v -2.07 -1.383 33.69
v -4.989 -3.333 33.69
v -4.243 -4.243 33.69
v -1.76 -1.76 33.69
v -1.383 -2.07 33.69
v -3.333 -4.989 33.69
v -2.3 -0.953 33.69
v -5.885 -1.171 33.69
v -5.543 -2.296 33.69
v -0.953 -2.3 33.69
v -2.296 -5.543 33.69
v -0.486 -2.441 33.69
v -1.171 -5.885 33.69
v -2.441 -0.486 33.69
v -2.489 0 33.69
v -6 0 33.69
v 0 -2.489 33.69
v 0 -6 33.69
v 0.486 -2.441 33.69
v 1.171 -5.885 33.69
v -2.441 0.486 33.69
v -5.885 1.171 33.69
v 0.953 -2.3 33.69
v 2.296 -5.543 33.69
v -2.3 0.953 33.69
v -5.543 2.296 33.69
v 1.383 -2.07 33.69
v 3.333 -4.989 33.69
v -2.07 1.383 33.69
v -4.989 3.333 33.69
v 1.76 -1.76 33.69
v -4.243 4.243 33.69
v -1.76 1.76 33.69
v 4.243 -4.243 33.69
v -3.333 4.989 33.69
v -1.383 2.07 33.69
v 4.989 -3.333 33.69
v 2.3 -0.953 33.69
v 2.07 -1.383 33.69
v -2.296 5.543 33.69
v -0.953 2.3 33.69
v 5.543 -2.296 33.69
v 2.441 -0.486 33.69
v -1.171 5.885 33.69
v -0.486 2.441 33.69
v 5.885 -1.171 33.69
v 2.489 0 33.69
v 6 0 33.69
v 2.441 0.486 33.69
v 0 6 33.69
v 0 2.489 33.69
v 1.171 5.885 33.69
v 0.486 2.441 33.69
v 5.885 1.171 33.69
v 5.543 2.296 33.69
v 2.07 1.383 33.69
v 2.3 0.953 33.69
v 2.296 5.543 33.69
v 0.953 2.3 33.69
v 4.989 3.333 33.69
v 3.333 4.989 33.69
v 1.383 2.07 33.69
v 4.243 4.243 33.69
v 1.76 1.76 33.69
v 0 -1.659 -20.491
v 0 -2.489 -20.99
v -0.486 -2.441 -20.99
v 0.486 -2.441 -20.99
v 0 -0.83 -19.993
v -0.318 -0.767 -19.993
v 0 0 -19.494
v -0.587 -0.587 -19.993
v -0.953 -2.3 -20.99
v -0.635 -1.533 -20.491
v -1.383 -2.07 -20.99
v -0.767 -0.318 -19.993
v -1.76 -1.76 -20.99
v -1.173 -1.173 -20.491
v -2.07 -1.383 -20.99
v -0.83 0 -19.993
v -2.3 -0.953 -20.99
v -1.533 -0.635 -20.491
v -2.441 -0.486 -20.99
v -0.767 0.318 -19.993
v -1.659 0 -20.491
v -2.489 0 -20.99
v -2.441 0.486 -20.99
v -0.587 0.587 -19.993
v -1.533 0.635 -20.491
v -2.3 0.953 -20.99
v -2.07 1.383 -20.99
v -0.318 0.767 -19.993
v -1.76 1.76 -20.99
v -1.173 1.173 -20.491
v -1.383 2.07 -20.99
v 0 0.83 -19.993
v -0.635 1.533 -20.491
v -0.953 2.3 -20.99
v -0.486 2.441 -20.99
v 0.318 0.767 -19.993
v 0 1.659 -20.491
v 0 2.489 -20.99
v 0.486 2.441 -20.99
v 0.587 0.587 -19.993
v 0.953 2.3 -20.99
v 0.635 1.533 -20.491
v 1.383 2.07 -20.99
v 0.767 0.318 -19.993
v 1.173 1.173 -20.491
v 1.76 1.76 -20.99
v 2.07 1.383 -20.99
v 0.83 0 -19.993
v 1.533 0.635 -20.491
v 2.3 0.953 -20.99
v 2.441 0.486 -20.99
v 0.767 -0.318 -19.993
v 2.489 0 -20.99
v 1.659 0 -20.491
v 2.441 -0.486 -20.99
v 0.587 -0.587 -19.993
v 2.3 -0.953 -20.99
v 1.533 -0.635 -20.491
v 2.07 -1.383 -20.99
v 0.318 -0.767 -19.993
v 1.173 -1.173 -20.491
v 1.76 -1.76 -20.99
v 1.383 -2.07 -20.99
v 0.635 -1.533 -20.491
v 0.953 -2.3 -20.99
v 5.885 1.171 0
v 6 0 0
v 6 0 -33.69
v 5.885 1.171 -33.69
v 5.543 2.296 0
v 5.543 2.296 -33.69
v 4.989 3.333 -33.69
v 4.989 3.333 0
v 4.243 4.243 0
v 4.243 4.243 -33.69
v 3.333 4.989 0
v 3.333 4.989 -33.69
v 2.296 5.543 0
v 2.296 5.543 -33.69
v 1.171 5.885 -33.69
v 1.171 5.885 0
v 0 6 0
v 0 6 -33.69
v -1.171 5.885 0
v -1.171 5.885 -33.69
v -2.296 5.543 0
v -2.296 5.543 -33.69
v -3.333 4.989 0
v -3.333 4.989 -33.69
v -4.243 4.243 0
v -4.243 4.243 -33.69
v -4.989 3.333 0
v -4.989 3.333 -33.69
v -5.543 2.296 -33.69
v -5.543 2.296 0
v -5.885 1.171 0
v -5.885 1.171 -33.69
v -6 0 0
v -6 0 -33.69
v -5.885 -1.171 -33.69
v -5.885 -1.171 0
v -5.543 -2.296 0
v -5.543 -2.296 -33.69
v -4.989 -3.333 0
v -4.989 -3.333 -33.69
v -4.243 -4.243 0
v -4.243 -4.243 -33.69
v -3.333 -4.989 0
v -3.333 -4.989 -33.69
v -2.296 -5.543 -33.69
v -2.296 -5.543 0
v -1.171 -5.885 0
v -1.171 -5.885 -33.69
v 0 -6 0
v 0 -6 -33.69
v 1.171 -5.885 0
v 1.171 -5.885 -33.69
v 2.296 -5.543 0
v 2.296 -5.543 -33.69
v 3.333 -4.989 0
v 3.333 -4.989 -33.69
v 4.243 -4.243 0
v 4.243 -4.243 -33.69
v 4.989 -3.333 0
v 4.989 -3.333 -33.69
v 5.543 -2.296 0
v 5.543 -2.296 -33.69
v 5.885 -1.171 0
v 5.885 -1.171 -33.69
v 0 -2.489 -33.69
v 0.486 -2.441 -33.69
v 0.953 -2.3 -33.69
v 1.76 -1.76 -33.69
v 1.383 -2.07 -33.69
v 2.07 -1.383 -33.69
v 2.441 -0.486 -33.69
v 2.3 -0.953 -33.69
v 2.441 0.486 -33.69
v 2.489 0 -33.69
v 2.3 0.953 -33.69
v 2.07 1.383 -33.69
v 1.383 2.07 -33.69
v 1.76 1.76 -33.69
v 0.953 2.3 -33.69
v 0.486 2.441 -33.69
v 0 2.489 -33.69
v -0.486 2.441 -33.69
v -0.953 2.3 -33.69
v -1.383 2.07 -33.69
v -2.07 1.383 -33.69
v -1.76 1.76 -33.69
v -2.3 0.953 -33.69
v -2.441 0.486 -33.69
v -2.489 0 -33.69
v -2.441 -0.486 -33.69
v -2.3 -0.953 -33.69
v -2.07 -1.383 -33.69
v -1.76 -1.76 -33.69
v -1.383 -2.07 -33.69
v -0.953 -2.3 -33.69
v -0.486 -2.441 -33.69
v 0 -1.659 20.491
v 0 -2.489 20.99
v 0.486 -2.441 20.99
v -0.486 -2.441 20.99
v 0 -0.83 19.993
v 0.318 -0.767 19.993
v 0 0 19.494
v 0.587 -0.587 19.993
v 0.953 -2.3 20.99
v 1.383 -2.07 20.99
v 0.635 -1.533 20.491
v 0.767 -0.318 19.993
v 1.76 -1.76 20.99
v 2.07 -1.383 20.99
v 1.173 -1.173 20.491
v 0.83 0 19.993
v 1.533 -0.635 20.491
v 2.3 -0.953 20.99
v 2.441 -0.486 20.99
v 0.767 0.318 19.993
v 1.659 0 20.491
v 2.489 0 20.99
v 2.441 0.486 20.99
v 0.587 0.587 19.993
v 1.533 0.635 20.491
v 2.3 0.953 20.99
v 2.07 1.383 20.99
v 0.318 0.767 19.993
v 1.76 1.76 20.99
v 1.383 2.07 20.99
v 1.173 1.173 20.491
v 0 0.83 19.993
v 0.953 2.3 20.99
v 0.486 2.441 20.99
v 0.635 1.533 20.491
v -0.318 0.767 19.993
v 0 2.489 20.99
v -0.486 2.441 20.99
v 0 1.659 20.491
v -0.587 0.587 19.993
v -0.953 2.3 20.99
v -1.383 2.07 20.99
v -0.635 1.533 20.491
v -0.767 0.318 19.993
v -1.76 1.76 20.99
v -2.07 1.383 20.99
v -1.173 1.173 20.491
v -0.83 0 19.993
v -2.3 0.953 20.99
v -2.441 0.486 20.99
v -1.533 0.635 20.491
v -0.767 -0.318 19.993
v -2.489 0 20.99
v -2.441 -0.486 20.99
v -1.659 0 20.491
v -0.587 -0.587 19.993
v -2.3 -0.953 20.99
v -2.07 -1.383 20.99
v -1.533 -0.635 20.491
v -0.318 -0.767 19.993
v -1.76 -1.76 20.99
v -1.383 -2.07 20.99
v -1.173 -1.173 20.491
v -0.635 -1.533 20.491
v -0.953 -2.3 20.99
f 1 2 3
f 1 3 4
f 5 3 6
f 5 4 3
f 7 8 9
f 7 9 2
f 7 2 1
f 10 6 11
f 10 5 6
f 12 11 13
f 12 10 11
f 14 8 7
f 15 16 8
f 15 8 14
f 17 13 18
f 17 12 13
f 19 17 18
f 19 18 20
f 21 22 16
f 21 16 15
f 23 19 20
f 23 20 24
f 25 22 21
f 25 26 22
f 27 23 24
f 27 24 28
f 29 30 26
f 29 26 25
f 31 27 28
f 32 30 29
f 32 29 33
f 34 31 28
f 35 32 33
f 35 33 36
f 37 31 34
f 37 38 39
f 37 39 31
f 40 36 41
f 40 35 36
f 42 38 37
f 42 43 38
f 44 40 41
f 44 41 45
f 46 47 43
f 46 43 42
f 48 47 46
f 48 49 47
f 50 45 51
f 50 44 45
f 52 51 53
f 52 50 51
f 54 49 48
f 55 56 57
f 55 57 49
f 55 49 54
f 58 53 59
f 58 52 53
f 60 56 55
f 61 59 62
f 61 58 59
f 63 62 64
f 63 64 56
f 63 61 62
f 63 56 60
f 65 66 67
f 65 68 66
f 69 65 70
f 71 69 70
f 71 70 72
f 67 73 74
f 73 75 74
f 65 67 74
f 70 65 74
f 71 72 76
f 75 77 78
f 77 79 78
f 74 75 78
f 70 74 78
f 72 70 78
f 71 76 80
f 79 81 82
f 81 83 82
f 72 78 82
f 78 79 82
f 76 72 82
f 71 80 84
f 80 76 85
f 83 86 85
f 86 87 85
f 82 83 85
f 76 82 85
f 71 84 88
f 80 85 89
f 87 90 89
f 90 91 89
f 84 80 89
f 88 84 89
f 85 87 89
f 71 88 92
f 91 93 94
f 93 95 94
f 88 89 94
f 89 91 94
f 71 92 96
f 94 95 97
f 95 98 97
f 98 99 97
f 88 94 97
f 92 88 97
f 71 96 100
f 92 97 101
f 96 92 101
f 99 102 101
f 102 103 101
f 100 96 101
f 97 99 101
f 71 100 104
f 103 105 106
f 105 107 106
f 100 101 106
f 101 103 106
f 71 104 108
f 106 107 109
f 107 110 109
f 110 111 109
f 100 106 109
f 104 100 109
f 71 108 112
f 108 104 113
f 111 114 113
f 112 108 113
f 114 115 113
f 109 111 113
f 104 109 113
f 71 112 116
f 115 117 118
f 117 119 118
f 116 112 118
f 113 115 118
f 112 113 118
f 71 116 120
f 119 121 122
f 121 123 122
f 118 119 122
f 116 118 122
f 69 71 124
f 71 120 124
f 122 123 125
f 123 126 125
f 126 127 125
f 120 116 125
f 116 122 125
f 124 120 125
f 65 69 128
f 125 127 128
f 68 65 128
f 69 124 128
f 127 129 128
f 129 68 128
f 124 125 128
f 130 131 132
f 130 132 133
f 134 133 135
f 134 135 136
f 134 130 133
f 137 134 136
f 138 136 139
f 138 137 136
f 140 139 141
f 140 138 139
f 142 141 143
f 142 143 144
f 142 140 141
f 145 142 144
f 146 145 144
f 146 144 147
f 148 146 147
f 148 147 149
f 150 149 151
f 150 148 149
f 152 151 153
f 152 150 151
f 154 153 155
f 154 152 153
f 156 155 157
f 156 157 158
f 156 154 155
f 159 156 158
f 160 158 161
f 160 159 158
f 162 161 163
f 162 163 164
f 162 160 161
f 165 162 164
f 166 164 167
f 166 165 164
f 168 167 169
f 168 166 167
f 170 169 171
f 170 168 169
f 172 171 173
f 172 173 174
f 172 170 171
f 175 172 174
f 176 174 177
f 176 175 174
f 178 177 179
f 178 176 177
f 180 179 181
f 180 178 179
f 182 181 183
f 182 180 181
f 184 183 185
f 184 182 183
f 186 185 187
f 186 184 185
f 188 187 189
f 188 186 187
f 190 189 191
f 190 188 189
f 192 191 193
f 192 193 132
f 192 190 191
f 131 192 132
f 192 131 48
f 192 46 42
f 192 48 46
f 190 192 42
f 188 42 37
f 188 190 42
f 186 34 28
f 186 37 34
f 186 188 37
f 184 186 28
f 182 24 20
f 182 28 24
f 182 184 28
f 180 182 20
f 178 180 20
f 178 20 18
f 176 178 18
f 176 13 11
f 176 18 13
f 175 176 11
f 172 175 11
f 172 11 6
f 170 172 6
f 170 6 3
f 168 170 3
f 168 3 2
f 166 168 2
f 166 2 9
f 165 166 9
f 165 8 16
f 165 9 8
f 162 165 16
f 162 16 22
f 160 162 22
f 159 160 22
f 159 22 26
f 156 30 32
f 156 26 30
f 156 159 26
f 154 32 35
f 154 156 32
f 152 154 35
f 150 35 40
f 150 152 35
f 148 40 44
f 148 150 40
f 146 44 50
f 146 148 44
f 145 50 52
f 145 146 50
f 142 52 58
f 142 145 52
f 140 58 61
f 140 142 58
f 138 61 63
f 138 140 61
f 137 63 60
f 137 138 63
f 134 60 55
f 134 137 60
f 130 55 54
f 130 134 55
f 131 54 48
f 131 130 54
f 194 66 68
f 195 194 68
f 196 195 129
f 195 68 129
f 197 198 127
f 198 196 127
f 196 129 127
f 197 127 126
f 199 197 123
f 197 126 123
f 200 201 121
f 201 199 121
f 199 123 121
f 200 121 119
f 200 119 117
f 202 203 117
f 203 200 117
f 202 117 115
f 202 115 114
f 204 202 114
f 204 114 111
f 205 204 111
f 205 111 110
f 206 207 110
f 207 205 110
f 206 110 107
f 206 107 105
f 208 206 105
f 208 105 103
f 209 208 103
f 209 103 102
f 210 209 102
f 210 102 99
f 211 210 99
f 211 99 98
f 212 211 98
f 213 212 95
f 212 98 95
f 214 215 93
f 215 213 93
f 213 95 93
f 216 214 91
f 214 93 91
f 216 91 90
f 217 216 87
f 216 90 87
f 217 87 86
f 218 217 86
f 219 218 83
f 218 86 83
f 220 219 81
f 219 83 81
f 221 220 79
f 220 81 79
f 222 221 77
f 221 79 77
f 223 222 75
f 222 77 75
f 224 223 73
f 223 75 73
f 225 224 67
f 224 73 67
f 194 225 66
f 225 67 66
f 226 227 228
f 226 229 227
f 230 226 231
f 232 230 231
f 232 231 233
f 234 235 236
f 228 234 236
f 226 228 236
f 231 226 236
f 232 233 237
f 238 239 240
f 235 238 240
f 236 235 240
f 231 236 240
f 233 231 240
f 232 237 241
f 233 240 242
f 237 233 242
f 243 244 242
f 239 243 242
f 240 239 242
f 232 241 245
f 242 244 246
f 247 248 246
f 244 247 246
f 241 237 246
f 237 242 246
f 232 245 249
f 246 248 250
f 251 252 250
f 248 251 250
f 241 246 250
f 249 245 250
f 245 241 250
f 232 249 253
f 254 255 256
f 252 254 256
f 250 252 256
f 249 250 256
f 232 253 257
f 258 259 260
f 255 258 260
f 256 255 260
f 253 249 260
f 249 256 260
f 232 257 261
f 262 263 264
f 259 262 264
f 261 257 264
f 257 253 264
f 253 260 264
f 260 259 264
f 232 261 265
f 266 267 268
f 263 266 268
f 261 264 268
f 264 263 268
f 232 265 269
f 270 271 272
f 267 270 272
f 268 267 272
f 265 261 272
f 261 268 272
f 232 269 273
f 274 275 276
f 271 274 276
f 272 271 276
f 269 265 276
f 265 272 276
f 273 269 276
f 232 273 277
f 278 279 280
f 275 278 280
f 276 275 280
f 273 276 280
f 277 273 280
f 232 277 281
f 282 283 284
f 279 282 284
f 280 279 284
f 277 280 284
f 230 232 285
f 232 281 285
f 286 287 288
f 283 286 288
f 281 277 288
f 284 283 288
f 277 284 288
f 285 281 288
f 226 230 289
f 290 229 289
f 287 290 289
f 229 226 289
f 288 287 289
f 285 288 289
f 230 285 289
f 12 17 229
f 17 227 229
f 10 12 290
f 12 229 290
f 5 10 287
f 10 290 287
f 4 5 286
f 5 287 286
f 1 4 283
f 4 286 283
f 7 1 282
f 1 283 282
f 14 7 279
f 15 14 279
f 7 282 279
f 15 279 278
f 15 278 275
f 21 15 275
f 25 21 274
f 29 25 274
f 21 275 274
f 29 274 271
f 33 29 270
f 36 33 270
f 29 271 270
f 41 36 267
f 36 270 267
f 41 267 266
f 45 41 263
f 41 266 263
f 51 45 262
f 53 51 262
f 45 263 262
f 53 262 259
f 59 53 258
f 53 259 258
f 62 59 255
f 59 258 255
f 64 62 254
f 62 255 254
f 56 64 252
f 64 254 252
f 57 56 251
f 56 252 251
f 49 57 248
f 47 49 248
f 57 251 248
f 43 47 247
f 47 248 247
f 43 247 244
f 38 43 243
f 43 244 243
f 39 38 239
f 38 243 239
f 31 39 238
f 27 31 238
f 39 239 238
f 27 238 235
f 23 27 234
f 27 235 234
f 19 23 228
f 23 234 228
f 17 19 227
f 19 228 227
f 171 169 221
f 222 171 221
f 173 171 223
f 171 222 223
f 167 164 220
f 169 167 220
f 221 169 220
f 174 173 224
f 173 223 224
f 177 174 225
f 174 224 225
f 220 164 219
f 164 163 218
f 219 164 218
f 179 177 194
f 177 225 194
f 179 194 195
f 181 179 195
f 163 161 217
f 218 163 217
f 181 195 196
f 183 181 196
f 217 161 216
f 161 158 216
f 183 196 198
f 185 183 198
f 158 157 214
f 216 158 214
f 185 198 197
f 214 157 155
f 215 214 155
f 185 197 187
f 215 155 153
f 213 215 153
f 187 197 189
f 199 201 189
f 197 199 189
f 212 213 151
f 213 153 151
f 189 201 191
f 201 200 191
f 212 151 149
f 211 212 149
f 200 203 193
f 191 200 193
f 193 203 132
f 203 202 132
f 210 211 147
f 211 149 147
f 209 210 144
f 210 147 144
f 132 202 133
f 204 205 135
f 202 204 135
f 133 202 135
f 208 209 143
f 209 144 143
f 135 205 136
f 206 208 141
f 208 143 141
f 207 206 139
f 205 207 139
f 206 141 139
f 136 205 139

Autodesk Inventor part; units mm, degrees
ref_plane "YZ Plane" through (0, 0, 0) normal (1, 0, 0) x (0, 1, 0)
ref_plane "XZ Plane" through (0, 0, 0) normal (0, 1, 0) x (-1, 0, 0)
ref_plane "XY Plane" through (0, 0, 0) normal (0, 0, 1) x (1, 0, 0)
sketch "Sketch1" plane through (0, 0, 0) normal (0, 0, 1) x (1, 0, 0)
  circle A0 centre (0, 0) radius 6
  dimension "d0" = 12
extrude "Extrusion1" add sketch "Sketch1" along normal mid plane 67.38
sketch "Sketch2" plane through (0, 0, 33.69) normal (0, 0, 1) x (1, 0, 0)
  circle A0 centre (0, 0) radius 6 projected
hole "Hole1" at (0, 0, 33.69) direction (0, 0, -1) diameter 4.9784 depth 12.7 tip angle 118 thread size "1/4-20 UNC" class "2B" standard "ANSI Unified Screw Threads"
mirror "Mirror1" about plane through (0, 0, 0) normal (0, 0, 1) of "Hole1"
properties part number "Dead Axle" material "Steel"
